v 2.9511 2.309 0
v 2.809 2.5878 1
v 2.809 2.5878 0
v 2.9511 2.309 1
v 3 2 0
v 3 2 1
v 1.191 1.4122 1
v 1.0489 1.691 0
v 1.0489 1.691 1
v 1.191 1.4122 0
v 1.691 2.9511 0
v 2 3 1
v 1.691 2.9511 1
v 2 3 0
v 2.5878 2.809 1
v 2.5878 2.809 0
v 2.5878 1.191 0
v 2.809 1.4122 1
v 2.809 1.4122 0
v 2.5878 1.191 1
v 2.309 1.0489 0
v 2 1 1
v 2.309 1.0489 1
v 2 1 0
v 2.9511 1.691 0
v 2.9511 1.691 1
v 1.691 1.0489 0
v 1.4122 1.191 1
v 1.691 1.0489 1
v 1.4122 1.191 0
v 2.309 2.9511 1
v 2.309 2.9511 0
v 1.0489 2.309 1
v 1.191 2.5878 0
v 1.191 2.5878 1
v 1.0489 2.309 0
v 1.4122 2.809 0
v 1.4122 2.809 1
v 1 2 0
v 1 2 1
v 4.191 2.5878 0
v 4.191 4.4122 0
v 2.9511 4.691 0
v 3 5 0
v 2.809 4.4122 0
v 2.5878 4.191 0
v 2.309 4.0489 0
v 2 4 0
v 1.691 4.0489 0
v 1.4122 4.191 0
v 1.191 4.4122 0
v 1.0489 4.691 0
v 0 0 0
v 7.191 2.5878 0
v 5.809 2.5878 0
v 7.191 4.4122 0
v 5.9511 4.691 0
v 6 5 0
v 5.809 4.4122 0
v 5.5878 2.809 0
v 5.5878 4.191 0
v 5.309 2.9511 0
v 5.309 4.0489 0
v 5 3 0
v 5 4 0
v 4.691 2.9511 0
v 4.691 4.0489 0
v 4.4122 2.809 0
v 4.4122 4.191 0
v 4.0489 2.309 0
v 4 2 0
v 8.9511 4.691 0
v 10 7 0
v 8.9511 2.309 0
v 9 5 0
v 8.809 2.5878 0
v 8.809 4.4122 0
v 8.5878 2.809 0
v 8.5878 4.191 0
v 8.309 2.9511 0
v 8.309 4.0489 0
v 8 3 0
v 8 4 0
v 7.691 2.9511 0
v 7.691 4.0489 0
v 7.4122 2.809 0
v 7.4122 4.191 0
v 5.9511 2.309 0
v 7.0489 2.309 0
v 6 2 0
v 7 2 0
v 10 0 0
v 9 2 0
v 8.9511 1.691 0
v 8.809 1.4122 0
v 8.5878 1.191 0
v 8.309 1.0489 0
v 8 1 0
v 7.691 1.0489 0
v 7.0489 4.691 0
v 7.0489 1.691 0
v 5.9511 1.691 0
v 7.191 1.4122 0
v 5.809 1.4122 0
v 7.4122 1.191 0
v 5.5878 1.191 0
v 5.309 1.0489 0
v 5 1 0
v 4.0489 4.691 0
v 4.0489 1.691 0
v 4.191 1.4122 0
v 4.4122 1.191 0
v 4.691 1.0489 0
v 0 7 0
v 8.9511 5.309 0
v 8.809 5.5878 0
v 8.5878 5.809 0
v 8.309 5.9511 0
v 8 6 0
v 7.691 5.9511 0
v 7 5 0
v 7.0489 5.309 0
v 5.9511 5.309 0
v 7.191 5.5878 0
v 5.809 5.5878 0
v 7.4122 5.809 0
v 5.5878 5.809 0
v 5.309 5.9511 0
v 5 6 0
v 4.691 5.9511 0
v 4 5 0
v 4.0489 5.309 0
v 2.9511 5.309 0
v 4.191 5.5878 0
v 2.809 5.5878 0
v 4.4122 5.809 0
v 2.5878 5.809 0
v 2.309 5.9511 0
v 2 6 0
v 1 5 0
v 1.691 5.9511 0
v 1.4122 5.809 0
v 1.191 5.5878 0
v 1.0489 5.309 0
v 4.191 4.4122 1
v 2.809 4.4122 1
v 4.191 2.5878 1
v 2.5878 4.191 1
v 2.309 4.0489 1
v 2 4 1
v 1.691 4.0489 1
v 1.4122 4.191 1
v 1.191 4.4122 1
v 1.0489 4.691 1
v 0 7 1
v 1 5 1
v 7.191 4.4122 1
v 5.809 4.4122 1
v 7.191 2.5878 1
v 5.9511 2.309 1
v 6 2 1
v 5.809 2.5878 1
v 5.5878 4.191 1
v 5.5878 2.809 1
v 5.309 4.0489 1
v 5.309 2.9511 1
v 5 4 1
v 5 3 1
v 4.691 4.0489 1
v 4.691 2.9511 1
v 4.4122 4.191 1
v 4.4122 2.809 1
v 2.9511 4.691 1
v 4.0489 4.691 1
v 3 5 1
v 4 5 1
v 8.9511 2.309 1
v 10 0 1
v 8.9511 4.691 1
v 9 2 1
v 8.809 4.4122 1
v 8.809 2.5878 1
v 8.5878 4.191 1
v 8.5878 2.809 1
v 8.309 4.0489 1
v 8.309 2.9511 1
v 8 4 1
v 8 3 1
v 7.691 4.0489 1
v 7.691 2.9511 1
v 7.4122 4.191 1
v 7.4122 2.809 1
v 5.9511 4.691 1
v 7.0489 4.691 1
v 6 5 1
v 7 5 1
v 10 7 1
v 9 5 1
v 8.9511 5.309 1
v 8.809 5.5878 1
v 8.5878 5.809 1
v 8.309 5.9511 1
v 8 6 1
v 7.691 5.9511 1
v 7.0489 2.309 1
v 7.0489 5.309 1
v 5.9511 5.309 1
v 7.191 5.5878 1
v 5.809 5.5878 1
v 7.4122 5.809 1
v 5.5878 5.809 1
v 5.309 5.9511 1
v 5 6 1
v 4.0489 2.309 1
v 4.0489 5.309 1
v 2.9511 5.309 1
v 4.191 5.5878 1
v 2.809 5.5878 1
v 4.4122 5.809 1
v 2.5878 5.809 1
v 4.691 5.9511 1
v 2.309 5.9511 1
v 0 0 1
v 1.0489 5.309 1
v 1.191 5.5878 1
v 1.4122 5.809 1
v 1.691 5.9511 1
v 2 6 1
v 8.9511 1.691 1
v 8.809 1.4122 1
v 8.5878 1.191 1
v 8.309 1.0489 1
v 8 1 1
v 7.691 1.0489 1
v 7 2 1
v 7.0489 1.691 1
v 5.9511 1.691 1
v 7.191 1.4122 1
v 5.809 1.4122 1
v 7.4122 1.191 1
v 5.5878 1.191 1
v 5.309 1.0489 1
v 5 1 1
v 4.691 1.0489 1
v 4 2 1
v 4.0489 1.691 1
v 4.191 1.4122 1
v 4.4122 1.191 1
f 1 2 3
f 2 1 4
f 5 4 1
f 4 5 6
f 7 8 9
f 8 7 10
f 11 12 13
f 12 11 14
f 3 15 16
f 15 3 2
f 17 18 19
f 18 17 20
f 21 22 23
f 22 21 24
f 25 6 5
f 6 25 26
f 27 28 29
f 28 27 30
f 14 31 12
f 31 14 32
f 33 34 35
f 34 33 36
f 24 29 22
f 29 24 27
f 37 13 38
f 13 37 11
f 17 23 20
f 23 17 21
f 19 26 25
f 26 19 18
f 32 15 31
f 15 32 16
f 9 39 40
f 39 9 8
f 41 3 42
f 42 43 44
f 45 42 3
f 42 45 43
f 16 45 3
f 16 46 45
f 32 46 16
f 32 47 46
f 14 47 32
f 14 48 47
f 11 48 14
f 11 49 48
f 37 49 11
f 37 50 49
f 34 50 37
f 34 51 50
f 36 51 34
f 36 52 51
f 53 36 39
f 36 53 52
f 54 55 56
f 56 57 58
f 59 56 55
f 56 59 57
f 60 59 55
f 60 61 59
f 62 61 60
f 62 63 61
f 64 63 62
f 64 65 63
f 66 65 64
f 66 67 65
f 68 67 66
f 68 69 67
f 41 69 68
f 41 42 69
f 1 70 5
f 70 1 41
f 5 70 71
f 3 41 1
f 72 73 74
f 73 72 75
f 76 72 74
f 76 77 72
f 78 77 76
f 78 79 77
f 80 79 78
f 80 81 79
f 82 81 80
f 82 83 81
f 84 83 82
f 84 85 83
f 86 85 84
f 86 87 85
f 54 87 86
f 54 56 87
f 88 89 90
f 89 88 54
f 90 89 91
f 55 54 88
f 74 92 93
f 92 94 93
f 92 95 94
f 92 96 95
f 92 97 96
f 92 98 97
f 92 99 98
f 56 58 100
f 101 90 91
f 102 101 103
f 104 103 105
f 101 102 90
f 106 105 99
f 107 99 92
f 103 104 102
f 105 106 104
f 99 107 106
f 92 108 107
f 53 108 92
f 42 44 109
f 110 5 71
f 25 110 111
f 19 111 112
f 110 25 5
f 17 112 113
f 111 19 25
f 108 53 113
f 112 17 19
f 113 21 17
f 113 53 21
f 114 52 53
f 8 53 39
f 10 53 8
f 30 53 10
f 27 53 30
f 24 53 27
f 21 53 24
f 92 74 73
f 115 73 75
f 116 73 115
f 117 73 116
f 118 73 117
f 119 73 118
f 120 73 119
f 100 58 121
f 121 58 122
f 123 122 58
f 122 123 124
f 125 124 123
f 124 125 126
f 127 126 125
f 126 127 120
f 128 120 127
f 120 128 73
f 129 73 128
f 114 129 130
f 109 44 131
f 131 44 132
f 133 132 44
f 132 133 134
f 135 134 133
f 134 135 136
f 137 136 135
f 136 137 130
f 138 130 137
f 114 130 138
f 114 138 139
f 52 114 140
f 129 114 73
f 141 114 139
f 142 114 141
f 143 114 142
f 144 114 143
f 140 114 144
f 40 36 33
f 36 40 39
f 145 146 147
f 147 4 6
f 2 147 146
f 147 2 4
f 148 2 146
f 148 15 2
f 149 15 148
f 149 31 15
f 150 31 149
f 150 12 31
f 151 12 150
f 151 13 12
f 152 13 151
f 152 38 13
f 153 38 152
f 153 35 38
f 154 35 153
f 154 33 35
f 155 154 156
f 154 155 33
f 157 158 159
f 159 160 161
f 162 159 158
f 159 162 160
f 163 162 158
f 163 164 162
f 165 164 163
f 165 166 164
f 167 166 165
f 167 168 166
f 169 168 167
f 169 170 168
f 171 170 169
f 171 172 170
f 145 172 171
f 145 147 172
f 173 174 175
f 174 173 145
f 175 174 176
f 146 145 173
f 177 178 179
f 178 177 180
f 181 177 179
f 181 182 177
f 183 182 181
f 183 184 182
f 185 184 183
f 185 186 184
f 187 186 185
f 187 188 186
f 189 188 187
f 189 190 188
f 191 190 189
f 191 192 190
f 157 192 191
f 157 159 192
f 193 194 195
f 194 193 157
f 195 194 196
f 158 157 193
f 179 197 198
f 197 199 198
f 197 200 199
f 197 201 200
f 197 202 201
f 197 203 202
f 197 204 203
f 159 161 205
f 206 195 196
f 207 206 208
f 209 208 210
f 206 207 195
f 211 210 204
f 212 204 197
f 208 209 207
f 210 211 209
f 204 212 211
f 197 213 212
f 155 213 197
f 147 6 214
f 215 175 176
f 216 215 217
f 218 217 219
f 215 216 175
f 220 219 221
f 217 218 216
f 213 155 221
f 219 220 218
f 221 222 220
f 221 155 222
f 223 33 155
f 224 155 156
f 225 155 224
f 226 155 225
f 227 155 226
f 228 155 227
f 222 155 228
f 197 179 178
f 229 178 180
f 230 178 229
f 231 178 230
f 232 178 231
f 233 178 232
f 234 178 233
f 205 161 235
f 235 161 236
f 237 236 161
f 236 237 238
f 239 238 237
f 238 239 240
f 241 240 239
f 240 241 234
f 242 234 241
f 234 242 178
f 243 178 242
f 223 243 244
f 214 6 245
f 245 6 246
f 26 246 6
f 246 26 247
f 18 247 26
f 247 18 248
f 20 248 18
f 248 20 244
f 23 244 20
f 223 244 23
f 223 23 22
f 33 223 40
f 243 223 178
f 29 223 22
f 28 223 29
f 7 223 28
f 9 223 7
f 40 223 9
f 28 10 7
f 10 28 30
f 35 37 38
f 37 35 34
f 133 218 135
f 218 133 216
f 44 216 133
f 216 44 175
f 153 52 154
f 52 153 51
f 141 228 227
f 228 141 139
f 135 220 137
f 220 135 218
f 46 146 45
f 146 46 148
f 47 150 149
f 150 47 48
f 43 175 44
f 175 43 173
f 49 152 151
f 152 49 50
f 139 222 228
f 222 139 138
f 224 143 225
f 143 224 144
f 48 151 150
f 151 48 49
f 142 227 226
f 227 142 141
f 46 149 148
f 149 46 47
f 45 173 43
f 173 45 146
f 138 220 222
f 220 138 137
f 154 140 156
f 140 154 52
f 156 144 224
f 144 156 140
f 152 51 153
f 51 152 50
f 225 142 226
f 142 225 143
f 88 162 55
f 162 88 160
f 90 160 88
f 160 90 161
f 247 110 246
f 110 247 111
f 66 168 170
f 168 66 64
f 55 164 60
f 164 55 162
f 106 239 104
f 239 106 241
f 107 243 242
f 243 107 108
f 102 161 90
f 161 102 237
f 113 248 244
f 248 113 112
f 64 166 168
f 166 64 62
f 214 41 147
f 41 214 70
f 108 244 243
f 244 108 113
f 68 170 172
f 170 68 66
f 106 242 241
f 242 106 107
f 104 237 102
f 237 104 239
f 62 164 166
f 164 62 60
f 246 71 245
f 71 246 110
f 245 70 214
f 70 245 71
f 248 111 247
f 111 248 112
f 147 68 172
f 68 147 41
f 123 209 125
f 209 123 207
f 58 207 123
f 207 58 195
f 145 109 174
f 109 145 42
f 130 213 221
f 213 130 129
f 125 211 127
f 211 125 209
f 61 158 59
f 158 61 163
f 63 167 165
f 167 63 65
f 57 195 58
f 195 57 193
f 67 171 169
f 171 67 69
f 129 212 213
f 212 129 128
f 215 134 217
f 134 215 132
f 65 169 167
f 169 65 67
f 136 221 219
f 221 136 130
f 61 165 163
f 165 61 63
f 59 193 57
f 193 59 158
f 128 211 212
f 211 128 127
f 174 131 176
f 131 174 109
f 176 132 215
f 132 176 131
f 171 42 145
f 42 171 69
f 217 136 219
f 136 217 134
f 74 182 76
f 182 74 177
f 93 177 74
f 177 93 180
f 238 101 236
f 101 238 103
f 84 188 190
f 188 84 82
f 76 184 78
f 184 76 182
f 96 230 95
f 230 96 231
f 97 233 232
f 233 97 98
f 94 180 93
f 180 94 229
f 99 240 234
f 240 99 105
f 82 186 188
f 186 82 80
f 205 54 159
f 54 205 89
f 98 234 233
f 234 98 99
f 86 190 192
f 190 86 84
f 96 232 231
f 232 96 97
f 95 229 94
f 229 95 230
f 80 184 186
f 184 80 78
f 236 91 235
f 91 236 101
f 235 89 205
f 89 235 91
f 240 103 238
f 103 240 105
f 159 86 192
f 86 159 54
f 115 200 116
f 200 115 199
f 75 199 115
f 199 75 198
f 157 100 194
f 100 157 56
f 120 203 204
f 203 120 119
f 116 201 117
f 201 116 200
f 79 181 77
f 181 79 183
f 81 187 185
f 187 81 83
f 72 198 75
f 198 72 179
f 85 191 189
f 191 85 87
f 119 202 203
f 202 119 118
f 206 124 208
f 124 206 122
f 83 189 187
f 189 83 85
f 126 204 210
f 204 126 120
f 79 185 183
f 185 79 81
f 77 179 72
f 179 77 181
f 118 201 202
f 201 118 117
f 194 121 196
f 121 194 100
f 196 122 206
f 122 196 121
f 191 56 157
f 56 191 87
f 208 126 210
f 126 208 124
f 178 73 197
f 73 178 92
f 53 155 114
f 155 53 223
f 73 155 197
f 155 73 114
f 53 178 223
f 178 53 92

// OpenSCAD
CELL_LENGTH = 10;
CELL_WIDTH = 7;
COVER_HEIGHT = 1;
CELL_MARGIN_LENGTH = 2;
CELL_MARGIN_WIDTH = 2;
DOT_RADIUS = 1;
DOT_RADIUS_RATIO = 0.7;
DOT_DISTANCE = 3; // center-to-center distance
LEVER_ARM_LENGTH = 30;
DOT_HEIGHT = COVER_HEIGHT * 2 + 2;

$fn = 20;

// Create a cell surface with 6 dot holes
difference() {
    // cell surface
    color("lavender")
        cube([CELL_LENGTH, CELL_WIDTH, COVER_HEIGHT]);

    // 6 dot holes
    for (centerX = [CELL_MARGIN_LENGTH : DOT_DISTANCE : CELL_MARGIN_LENGTH + 2 * DOT_DISTANCE]) 
        for (centerY = [CELL_MARGIN_WIDTH : DOT_DISTANCE : CELL_MARGIN_WIDTH + DOT_DISTANCE]) 
            translate([centerX, centerY, 0]) 
                cylinder(r=DOT_RADIUS, h=COVER_HEIGHT);
}
